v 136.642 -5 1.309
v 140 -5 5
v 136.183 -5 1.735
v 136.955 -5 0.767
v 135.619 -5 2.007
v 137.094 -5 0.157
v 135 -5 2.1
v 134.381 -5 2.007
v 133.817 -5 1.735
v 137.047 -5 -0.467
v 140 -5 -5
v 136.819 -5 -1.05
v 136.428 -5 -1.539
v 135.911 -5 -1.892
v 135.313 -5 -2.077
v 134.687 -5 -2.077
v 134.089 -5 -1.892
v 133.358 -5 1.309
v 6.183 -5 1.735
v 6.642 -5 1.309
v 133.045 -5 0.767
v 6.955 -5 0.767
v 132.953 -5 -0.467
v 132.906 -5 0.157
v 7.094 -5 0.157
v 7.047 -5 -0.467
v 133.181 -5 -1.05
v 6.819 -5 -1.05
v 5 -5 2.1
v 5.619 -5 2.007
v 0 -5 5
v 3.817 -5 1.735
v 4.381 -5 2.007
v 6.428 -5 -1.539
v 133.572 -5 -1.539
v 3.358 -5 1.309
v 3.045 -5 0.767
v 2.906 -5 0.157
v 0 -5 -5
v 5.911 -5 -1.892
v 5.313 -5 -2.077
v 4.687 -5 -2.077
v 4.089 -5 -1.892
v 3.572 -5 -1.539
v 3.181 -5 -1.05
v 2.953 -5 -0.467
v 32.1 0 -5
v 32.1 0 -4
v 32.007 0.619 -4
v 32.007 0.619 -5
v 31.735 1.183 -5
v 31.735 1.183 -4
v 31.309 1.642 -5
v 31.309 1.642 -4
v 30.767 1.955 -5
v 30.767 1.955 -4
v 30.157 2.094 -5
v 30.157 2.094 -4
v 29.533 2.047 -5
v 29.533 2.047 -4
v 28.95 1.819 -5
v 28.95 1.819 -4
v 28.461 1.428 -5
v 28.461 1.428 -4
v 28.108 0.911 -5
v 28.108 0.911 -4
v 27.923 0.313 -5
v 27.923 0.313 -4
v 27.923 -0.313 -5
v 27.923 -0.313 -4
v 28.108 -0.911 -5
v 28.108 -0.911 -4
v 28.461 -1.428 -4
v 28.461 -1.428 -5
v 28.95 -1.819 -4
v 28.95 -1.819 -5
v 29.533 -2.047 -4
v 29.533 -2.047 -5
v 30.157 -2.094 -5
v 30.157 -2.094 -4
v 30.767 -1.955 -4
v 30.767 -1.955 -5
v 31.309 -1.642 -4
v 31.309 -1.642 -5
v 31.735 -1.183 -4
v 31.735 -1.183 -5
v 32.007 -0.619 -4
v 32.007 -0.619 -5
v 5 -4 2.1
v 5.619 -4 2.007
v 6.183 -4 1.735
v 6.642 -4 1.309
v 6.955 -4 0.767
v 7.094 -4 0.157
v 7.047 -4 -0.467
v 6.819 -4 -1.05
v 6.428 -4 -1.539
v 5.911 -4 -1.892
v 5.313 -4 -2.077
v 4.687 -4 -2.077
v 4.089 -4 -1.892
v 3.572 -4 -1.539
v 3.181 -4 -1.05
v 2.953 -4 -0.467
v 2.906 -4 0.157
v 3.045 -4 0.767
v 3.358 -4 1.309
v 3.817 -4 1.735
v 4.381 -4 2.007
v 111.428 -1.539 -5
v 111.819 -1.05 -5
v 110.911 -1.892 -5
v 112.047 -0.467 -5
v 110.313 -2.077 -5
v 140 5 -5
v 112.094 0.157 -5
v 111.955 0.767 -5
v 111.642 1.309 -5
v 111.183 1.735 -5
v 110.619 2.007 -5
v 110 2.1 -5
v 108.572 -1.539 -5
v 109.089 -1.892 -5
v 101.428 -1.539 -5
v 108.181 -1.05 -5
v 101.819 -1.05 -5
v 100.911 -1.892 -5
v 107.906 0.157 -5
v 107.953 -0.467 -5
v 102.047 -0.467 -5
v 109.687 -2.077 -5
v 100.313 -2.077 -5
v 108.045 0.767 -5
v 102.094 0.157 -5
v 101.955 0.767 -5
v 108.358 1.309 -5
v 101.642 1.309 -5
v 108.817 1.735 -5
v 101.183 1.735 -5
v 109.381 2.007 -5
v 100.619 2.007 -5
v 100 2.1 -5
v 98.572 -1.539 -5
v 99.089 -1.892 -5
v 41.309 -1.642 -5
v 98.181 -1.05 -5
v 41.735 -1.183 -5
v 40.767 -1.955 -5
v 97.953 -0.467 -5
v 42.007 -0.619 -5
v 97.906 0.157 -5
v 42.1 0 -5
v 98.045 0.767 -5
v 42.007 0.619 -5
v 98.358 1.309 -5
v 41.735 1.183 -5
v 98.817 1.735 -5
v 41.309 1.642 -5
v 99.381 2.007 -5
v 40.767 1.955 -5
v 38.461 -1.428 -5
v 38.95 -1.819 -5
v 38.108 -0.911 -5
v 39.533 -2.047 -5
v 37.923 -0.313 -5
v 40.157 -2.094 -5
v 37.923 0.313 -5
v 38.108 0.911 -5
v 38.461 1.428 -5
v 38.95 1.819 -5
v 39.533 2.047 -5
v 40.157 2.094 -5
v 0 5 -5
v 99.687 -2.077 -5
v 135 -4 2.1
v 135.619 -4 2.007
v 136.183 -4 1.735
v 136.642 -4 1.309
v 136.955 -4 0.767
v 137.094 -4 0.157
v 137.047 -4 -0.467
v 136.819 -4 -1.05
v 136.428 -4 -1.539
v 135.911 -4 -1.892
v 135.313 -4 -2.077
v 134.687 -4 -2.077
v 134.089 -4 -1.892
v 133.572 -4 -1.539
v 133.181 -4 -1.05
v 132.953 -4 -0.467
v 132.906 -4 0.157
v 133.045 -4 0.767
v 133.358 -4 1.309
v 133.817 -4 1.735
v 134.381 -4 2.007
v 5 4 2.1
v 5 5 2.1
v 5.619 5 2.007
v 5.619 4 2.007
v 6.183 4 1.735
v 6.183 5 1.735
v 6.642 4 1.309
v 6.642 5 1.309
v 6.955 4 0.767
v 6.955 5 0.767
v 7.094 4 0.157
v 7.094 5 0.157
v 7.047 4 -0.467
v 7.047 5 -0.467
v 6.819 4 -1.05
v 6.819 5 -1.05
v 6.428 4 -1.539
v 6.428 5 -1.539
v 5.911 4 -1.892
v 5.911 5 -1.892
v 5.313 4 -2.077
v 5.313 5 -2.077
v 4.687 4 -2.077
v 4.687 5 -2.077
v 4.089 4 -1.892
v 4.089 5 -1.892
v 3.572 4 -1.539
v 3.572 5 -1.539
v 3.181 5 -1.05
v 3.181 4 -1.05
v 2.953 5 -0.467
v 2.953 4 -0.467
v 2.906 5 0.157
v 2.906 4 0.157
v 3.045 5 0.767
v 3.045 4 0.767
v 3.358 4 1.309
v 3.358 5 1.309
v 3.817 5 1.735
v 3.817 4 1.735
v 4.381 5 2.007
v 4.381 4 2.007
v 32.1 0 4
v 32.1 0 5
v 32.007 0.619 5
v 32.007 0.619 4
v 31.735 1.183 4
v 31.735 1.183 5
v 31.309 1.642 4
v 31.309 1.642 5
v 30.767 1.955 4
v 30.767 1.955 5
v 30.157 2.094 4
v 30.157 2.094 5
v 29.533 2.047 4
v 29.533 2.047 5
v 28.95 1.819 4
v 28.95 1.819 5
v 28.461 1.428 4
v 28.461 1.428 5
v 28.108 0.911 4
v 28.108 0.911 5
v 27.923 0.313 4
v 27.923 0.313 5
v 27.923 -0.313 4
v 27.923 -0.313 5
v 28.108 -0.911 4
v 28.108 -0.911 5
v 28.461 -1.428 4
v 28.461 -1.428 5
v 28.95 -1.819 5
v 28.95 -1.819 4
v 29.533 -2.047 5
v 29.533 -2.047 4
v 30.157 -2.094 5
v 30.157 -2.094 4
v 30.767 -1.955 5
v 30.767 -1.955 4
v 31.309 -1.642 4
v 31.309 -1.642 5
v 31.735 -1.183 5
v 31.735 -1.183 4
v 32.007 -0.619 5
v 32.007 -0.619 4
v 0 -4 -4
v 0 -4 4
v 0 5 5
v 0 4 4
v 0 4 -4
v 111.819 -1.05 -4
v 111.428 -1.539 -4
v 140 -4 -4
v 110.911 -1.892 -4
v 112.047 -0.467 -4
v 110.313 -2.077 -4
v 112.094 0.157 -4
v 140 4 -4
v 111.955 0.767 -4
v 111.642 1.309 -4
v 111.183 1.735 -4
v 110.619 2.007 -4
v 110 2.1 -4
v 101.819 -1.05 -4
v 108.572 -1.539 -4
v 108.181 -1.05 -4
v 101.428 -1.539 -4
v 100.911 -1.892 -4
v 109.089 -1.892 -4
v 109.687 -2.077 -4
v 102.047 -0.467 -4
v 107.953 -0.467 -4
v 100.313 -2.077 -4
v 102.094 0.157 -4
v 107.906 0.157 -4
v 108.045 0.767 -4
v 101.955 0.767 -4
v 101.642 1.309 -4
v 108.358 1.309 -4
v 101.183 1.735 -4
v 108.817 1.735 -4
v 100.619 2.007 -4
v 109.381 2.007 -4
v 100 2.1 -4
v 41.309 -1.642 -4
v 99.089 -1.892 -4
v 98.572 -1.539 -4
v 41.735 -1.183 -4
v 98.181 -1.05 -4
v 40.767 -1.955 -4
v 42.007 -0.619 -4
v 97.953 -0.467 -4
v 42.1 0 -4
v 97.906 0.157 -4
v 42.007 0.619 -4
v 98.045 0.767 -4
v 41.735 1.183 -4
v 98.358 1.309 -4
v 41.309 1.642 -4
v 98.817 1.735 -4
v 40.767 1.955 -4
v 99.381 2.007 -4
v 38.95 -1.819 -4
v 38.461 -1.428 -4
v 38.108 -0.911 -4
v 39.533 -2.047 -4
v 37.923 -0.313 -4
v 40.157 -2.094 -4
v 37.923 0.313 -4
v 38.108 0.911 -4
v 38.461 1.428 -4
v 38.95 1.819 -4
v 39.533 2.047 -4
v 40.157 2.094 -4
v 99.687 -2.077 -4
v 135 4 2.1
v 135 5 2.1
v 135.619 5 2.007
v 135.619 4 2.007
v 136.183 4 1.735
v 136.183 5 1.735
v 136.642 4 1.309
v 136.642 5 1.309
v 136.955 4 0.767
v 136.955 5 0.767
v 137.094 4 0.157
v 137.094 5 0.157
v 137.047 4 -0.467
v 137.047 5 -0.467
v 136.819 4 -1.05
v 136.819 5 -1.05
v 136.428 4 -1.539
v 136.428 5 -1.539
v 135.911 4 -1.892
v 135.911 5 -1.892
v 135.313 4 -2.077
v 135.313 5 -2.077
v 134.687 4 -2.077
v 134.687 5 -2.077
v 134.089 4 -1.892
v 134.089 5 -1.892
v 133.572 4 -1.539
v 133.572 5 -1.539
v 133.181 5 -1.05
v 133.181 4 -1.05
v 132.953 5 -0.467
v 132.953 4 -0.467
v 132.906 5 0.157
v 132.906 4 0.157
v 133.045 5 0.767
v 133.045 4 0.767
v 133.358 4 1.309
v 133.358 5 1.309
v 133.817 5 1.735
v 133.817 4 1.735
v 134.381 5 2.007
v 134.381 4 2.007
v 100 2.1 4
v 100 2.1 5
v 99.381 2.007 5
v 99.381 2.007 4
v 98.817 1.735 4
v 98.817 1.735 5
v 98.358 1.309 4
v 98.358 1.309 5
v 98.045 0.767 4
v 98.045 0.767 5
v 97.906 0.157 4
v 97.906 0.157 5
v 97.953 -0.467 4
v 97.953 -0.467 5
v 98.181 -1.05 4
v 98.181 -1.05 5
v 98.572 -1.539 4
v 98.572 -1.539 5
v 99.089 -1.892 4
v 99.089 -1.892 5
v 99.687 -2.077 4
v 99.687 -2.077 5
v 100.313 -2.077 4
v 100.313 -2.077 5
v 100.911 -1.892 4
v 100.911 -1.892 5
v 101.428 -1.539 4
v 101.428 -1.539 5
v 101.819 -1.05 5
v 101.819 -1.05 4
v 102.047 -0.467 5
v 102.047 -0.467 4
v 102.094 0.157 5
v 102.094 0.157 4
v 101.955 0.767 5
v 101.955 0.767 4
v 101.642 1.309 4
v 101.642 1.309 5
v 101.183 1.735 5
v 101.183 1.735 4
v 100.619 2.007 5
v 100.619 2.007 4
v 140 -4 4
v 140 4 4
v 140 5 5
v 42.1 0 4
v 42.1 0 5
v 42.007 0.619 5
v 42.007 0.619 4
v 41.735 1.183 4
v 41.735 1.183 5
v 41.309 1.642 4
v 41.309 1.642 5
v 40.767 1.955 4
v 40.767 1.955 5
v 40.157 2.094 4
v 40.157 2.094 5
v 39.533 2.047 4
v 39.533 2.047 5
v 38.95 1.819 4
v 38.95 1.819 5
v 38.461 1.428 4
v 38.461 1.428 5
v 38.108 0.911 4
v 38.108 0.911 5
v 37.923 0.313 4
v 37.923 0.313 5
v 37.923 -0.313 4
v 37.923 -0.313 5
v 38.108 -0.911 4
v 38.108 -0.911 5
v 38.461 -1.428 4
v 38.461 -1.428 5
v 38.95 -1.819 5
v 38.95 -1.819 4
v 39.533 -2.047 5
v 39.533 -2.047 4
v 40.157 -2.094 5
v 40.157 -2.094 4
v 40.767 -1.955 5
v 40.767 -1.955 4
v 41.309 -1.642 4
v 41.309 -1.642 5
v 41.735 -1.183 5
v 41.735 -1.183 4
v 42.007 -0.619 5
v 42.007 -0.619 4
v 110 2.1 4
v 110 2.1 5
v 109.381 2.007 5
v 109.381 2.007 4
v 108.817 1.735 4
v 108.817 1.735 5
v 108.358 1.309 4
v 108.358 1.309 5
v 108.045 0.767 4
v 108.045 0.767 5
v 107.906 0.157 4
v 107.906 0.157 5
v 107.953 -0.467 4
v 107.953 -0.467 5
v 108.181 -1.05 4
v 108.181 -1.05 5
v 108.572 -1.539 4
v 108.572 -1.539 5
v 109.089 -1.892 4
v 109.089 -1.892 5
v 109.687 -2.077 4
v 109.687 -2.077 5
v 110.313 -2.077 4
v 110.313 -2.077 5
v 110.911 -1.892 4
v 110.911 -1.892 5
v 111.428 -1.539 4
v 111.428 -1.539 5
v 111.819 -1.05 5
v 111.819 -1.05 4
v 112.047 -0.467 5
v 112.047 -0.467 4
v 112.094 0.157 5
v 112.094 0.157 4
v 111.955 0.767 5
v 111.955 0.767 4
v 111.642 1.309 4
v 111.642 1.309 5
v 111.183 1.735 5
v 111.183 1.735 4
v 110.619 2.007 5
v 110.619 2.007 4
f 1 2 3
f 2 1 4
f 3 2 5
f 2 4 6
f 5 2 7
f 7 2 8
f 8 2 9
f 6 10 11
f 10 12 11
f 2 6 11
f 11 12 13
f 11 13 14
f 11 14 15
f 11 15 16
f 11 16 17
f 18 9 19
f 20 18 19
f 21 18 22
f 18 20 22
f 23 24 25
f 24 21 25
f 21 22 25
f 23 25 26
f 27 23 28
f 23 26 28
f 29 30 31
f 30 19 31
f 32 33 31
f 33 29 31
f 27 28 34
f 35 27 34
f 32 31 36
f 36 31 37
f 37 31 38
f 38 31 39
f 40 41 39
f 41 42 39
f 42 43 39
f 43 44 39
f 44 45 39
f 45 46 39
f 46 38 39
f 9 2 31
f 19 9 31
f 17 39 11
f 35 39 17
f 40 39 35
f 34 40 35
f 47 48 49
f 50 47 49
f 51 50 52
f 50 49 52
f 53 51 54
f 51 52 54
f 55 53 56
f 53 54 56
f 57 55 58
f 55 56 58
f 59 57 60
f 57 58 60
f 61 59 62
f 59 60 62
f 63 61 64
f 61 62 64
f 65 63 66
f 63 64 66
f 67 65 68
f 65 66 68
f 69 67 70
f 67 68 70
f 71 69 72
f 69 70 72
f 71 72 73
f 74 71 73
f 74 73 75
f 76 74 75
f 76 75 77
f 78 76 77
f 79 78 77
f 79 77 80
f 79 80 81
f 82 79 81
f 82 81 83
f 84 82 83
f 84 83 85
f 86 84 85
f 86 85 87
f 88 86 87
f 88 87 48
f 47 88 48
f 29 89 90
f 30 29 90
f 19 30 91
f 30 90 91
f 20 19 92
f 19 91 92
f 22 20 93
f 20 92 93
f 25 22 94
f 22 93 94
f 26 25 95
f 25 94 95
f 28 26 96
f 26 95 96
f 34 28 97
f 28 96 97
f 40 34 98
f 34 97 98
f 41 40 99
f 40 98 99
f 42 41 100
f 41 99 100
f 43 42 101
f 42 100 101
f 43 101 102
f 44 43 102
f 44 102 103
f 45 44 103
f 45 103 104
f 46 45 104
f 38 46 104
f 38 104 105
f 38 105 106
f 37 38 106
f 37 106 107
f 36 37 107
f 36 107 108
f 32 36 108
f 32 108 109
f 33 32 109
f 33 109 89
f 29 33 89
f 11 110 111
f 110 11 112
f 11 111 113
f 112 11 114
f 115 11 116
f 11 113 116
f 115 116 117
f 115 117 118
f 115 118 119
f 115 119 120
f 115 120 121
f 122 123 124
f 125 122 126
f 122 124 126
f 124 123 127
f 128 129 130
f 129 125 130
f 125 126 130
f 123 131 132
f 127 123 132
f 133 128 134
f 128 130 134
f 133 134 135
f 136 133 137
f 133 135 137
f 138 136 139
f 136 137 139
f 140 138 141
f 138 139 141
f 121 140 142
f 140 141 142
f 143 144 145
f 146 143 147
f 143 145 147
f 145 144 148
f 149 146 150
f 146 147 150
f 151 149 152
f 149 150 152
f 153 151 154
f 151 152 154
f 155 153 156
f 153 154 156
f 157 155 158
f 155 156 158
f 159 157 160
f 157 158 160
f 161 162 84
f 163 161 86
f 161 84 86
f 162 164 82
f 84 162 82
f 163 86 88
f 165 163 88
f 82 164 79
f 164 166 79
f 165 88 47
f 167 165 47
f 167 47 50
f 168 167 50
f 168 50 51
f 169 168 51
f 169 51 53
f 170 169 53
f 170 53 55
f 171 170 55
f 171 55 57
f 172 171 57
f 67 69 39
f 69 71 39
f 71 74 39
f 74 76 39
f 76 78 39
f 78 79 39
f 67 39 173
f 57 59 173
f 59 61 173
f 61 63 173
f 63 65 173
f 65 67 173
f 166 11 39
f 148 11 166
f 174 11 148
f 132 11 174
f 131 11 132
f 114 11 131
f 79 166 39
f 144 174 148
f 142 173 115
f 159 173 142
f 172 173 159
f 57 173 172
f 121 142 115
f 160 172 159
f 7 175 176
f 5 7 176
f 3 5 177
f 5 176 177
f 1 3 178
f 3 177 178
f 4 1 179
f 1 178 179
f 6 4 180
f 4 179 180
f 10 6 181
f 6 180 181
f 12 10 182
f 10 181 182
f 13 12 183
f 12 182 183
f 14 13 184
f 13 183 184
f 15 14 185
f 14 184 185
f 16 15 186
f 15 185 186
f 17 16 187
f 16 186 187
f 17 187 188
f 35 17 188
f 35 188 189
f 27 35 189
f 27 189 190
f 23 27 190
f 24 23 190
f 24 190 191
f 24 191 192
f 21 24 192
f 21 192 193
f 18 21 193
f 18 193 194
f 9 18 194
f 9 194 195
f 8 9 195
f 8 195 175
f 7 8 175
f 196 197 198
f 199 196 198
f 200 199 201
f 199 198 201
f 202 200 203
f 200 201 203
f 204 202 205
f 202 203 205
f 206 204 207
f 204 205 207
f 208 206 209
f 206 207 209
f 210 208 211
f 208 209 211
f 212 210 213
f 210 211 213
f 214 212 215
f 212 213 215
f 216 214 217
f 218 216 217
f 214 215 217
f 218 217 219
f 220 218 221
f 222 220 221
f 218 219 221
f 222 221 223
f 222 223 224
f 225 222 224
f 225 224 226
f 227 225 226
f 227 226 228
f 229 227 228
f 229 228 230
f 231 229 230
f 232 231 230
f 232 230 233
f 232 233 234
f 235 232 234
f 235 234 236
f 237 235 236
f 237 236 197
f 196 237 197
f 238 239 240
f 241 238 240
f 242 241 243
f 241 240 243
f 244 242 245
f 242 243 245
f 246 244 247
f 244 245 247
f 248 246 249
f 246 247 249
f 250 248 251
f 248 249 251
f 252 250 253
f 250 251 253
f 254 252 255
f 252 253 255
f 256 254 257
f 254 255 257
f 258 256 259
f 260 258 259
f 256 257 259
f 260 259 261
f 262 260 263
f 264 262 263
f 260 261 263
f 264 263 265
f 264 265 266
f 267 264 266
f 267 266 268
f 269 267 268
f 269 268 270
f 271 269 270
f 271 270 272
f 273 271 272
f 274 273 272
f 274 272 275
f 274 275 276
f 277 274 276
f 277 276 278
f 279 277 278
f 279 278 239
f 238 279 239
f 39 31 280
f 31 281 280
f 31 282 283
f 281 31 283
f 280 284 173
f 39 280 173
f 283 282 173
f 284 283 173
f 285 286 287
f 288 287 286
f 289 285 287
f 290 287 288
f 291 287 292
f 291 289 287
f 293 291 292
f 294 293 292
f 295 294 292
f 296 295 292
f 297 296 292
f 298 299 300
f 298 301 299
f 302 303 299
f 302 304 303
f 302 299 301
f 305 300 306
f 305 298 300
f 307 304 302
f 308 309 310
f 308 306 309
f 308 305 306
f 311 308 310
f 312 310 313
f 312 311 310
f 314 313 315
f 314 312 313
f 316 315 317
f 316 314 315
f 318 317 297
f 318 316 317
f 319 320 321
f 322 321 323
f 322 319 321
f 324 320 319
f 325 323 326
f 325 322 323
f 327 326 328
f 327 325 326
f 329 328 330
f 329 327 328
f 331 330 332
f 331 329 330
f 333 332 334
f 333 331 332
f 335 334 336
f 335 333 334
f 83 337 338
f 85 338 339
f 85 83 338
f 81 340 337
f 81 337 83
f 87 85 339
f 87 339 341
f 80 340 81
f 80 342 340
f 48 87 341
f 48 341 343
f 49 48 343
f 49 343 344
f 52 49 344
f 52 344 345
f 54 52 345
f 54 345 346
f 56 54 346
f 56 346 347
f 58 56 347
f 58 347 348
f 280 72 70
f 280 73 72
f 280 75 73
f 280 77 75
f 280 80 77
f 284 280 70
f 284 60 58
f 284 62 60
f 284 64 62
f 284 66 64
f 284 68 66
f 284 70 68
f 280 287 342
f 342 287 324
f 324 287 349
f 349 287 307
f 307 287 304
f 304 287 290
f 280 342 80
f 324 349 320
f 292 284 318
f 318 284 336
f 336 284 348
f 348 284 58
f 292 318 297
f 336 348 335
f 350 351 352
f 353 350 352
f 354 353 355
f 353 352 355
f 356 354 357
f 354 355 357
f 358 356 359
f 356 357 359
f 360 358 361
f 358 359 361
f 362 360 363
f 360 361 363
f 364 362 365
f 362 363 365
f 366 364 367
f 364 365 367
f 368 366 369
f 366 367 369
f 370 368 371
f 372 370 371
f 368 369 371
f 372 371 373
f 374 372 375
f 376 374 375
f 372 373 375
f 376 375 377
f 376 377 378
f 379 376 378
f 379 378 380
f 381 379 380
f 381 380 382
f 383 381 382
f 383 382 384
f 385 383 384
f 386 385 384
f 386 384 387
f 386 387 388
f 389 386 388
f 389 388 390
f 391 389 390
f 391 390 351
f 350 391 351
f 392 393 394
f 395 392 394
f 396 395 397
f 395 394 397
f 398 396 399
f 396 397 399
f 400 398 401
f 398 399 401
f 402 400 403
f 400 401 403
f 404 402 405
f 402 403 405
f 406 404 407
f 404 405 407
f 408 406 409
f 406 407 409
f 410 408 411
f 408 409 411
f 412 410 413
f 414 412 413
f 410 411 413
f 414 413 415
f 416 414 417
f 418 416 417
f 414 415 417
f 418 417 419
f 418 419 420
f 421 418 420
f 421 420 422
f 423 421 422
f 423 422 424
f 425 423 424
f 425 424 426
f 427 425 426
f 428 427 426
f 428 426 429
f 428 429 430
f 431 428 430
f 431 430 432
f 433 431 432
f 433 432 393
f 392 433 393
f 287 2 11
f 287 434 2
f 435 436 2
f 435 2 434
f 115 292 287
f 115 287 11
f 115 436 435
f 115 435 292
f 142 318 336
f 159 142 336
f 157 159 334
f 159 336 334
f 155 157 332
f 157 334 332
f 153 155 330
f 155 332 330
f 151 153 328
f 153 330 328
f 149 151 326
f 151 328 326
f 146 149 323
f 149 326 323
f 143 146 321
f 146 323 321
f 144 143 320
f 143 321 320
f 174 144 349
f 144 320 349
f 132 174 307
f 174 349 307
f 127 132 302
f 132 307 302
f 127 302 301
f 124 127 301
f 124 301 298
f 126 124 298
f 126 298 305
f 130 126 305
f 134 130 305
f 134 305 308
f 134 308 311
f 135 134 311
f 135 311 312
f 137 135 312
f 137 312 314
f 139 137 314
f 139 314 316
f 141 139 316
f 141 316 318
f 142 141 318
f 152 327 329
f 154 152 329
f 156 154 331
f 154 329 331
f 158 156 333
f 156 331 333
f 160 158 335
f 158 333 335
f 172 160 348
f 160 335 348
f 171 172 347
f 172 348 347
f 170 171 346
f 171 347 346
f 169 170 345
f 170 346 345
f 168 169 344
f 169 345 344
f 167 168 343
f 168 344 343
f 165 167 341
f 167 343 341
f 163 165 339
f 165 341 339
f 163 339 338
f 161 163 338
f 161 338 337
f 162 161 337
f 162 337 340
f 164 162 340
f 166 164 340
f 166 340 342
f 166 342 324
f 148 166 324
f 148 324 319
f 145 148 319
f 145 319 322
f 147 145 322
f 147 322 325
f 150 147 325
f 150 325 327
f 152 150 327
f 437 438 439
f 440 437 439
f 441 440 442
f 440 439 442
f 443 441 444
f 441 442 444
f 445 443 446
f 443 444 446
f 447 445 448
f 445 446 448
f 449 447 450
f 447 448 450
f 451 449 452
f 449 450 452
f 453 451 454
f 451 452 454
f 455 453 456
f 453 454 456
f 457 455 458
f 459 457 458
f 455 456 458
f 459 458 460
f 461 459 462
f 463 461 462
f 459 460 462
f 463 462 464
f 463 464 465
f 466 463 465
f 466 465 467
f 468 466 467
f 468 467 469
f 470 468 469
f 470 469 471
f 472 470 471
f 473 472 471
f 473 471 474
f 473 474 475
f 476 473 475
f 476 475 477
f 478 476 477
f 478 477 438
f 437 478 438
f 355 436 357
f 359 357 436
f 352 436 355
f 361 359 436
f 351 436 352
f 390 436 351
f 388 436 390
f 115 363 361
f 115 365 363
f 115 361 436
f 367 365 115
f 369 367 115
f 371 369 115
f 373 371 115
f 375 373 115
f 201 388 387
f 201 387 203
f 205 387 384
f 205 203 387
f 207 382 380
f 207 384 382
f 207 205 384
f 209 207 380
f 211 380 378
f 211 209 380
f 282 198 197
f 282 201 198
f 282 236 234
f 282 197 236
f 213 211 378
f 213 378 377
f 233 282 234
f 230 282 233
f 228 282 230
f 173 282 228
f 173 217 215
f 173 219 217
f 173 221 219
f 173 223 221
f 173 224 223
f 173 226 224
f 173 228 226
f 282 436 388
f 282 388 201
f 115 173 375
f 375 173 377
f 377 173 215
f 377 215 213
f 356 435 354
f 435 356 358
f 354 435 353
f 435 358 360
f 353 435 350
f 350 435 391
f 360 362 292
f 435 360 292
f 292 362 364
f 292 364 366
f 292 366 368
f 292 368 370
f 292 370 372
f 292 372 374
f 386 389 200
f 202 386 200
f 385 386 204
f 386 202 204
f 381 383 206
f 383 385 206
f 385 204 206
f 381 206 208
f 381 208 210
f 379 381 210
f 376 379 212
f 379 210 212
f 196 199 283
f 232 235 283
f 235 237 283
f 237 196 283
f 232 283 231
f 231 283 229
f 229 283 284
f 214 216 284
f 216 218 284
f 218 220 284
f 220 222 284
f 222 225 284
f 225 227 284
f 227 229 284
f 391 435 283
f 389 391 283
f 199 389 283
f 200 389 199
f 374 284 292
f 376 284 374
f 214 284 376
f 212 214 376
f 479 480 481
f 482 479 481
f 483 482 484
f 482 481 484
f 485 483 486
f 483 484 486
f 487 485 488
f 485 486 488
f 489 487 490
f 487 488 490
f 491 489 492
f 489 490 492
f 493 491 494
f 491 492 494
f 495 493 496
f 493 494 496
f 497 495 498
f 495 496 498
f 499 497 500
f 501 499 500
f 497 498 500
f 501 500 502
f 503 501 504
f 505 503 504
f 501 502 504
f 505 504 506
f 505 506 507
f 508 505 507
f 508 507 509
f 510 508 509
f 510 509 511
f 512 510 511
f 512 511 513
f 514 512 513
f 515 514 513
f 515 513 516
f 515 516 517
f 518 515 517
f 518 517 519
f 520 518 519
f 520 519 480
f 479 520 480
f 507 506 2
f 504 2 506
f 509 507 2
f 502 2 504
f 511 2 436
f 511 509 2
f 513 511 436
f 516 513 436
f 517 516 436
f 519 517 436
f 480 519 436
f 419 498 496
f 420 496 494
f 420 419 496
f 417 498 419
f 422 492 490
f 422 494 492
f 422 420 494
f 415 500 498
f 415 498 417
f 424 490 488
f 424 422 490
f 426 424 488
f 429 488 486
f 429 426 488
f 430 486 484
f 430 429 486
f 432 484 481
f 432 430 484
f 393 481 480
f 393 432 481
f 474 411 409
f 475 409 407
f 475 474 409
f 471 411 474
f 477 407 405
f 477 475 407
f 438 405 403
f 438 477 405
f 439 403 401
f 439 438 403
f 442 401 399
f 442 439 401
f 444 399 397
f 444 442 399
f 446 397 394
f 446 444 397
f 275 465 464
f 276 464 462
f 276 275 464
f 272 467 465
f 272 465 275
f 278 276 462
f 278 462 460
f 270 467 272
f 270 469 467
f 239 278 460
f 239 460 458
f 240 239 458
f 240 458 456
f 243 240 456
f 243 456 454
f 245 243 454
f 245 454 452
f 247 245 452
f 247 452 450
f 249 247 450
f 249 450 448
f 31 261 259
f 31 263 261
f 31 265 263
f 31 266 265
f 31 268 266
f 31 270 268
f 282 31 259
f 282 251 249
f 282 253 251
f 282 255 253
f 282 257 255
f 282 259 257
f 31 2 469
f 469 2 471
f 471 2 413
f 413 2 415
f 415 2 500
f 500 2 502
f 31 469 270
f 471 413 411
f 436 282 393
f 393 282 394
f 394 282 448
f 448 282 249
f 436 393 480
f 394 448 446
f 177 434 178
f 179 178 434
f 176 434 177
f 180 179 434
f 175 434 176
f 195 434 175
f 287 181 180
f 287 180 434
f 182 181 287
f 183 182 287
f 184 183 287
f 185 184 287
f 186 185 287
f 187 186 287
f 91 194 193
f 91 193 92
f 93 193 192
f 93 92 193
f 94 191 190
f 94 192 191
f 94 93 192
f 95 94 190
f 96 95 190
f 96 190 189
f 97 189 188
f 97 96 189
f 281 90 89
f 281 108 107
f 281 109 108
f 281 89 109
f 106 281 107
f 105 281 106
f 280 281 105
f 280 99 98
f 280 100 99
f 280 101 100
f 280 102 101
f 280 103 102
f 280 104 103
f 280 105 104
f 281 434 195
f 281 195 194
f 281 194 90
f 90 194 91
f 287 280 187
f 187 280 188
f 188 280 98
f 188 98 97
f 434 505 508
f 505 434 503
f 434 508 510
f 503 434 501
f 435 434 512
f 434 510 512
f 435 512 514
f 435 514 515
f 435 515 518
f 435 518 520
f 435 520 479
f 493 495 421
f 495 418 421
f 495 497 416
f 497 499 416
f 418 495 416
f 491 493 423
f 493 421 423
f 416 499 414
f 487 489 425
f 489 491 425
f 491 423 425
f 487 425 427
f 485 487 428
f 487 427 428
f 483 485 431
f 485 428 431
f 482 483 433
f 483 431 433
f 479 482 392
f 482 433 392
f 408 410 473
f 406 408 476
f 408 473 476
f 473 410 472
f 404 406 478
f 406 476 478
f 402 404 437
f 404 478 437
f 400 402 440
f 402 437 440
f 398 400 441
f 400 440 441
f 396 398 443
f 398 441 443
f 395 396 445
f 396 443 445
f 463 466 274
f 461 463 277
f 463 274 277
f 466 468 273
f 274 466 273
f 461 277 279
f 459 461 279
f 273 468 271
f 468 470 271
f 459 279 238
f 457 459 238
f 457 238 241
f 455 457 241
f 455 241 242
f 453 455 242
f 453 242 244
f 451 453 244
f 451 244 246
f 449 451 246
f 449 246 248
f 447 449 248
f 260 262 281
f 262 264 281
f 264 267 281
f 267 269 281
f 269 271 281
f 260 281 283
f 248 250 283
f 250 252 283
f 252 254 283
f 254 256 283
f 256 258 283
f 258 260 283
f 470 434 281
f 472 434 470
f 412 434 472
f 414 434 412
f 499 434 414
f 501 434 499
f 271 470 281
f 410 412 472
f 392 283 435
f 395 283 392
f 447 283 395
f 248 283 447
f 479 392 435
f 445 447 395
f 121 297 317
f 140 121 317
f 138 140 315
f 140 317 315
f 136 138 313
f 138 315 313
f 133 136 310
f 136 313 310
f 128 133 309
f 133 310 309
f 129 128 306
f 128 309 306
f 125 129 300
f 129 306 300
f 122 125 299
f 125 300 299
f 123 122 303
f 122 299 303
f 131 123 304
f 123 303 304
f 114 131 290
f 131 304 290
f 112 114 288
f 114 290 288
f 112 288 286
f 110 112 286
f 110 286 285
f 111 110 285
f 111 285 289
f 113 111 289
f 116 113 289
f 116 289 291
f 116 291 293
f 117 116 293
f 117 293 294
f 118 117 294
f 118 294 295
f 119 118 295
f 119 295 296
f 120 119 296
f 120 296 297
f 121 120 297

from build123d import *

# Parameters (mm, degrees)
SKETCH_1_W          = 10
SKETCH_1_H          = 10
SKETCH_1_W_2        = 8
SKETCH_1_H_2        = 8
EXTRUDE_1_DEPTH     = 140
SKETCH_2_R          = 2.1
CUT_EXTRUDE_1_DEPTH = 141.445719052
SKETCH_3_R          = 2.1
CUT_EXTRUDE_2_DEPTH = 141.445719052


with BuildPart() as part:
    # ｽｹｯﾁ1 → 押し出し-薄板1 (new body)
    with BuildSketch(Plane(origin=(0, 0, 0), x_dir=(0, 0, -1), z_dir=(1, 0, 0))):
        Rectangle(SKETCH_1_W, SKETCH_1_H)
        Rectangle(SKETCH_1_W_2, SKETCH_1_H_2, mode=Mode.SUBTRACT)
    extrude(amount=EXTRUDE_1_DEPTH)

    # ｽｹｯﾁ2 → ｶｯﾄ - 押し出し1 (cut, through all)
    with BuildSketch(Plane(origin=(0, 5, 0), x_dir=(1, 0, 0), z_dir=(0, 1, 0))):
        with Locations(Location((5, 0, 0), (0, 0, 270))):
            Circle(SKETCH_2_R)
        with Locations(Location((135, 0, 0), (0, 0, 270))):
            Circle(SKETCH_2_R)
    extrude(amount=-CUT_EXTRUDE_1_DEPTH, mode=Mode.SUBTRACT)

    # ｽｹｯﾁ3 → ｶｯﾄ - 押し出し2 (cut, through all)
    with BuildSketch(Plane.XY.offset(5)):
        with Locations((40, 0)):
            Circle(SKETCH_3_R)
        with Locations((30, 0)):
            Circle(SKETCH_3_R)
        with Locations(Location((110, 0, 0), (0, 0, 90))):
            Circle(SKETCH_3_R)
        with Locations(Location((100, 0, 0), (0, 0, 90))):
            Circle(SKETCH_3_R)
    extrude(amount=-CUT_EXTRUDE_2_DEPTH, mode=Mode.SUBTRACT)


solid = part.part
